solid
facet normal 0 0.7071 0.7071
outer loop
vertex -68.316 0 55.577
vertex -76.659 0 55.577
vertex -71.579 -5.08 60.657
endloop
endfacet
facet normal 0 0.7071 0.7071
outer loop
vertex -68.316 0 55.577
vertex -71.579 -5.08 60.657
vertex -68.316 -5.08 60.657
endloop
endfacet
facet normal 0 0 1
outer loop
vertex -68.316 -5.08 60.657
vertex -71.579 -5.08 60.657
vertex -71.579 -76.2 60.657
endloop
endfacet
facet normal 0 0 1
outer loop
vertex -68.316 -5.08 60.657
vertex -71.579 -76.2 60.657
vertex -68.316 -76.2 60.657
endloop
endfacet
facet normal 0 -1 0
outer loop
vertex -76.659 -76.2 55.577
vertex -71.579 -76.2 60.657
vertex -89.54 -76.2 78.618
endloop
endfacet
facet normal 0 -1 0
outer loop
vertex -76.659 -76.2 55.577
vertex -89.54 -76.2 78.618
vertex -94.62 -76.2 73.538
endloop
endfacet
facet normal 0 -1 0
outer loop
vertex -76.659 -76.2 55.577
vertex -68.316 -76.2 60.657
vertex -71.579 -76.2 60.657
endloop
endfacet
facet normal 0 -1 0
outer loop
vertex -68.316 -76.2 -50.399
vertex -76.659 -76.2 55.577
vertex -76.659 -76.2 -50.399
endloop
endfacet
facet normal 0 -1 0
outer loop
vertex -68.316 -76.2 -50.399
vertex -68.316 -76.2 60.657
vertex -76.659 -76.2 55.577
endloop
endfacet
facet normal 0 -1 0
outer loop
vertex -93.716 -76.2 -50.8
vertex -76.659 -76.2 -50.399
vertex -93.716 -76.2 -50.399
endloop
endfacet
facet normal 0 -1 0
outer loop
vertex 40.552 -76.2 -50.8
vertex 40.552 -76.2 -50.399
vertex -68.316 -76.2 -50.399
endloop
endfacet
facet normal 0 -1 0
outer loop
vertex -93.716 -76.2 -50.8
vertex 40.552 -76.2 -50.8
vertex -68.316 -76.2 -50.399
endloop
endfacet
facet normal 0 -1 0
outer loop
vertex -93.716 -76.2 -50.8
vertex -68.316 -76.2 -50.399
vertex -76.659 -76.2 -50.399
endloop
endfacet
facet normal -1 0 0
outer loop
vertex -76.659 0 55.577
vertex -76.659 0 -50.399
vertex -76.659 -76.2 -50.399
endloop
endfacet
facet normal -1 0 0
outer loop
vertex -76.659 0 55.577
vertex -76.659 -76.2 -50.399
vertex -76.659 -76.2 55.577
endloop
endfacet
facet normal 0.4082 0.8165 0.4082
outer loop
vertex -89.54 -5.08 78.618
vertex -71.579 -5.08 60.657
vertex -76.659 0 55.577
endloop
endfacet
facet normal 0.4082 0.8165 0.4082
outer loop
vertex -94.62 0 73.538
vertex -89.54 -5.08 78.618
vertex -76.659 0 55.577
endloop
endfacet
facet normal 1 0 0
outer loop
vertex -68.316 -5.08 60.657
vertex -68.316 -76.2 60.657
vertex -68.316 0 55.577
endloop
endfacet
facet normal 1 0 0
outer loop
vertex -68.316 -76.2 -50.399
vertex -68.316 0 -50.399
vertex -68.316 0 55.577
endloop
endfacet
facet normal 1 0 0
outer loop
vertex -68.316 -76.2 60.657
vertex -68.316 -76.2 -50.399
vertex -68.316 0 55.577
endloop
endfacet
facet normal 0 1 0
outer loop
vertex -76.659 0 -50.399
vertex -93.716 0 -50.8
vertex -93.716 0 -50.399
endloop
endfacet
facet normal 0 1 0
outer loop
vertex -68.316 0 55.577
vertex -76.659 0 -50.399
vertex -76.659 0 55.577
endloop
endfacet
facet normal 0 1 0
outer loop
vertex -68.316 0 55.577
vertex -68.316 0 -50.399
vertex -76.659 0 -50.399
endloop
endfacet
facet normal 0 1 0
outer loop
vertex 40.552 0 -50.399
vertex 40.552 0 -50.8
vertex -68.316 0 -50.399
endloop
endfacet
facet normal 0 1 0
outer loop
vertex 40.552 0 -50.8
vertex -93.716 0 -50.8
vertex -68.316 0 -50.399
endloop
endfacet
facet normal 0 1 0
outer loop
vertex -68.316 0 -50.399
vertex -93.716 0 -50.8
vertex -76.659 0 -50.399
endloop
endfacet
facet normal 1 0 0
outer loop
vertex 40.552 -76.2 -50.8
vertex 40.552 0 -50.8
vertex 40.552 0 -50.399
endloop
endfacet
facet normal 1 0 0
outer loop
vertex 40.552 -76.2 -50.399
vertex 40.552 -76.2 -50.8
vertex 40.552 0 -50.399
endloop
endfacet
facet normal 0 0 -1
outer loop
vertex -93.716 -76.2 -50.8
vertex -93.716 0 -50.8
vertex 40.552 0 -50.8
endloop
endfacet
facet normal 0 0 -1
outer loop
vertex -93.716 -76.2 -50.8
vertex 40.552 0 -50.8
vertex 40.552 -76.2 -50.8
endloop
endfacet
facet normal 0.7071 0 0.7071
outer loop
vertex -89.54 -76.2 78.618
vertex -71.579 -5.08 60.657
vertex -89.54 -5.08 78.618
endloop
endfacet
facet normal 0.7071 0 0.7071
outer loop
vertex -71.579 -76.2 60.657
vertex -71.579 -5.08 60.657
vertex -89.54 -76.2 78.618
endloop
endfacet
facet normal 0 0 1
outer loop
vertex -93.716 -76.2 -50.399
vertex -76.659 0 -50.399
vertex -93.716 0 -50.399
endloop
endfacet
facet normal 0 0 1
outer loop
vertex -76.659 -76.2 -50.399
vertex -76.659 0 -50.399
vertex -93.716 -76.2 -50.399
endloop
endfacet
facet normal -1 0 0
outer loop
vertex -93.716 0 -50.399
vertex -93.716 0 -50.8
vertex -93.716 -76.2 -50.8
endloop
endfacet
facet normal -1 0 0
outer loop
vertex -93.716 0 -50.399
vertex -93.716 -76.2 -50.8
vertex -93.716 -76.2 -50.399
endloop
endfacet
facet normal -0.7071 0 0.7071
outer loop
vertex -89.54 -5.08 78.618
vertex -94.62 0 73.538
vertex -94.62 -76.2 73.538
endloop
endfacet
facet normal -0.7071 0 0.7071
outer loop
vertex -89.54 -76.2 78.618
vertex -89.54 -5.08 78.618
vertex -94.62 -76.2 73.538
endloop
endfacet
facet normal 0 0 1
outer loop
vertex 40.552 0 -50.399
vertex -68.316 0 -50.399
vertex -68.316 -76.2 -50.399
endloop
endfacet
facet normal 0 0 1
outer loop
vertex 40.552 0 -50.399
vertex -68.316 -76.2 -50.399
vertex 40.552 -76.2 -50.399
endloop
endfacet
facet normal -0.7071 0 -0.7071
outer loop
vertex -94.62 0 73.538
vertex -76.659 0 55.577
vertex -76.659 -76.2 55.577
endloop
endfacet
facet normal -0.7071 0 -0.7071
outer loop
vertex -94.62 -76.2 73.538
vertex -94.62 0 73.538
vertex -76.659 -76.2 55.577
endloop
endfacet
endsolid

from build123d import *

# Parameters (mm, degrees)
F0_W     = 8.3429142833
F0_H     = 111.0566146672
F1_DEPTH = 76.2
F0_W_2   = 108.8683158159
F0_H_2   = 0.4005401015
F2_DEPTH = 25.4
F3_SIZE  = 5.08
F4_DEPTH = 25.4


with BuildPart() as f1:
    # F0 (on Front) → F1 (new body)
    with BuildSketch(Plane.XZ):
        with Locations((-72.48769328, 5.1288474351)):
            Rectangle(F0_W, F0_H)
    extrude(amount=F1_DEPTH)



with BuildPart() as f1b:
    # F0 (on Front) → F1, piece 2 (new body)
    with BuildSketch(Plane.XZ):
        with Locations((-13.8820782304, -50.5997299492)):
            Rectangle(F0_W_2, F0_H_2)
    extrude(amount=F1_DEPTH)


with BuildPart() as f1_1:
    add(f1.part)
    # F2 (add): a face of the model
    f2_faces = [f1b.part.faces().sort_by_distance(p)[0] for p in [
        (-68.3162361383, -38.1, -50.5997299492),
    ]]

    add(f1b.part)  # F2 merges F1b
    extrude(f2_faces, amount=F2_DEPTH)

    # F3
    f3_edges = [f1_1.edges().sort_by_distance(p)[0] for p in [
        (-76.65915, -38.1, 60.657155),
        (-72.487693, 0, 60.657155),
    ]]
    chamfer(f3_edges, length=F3_SIZE)

    # F4 (add): a face of the model
    f4_faces = [f1_1.faces().sort_by_distance(p)[0] for p in [
        (-74.1483458239, -39.3554022989, 58.0879593664),
    ]]
    extrude(f4_faces, amount=F4_DEPTH)


solid = f1_1.part
